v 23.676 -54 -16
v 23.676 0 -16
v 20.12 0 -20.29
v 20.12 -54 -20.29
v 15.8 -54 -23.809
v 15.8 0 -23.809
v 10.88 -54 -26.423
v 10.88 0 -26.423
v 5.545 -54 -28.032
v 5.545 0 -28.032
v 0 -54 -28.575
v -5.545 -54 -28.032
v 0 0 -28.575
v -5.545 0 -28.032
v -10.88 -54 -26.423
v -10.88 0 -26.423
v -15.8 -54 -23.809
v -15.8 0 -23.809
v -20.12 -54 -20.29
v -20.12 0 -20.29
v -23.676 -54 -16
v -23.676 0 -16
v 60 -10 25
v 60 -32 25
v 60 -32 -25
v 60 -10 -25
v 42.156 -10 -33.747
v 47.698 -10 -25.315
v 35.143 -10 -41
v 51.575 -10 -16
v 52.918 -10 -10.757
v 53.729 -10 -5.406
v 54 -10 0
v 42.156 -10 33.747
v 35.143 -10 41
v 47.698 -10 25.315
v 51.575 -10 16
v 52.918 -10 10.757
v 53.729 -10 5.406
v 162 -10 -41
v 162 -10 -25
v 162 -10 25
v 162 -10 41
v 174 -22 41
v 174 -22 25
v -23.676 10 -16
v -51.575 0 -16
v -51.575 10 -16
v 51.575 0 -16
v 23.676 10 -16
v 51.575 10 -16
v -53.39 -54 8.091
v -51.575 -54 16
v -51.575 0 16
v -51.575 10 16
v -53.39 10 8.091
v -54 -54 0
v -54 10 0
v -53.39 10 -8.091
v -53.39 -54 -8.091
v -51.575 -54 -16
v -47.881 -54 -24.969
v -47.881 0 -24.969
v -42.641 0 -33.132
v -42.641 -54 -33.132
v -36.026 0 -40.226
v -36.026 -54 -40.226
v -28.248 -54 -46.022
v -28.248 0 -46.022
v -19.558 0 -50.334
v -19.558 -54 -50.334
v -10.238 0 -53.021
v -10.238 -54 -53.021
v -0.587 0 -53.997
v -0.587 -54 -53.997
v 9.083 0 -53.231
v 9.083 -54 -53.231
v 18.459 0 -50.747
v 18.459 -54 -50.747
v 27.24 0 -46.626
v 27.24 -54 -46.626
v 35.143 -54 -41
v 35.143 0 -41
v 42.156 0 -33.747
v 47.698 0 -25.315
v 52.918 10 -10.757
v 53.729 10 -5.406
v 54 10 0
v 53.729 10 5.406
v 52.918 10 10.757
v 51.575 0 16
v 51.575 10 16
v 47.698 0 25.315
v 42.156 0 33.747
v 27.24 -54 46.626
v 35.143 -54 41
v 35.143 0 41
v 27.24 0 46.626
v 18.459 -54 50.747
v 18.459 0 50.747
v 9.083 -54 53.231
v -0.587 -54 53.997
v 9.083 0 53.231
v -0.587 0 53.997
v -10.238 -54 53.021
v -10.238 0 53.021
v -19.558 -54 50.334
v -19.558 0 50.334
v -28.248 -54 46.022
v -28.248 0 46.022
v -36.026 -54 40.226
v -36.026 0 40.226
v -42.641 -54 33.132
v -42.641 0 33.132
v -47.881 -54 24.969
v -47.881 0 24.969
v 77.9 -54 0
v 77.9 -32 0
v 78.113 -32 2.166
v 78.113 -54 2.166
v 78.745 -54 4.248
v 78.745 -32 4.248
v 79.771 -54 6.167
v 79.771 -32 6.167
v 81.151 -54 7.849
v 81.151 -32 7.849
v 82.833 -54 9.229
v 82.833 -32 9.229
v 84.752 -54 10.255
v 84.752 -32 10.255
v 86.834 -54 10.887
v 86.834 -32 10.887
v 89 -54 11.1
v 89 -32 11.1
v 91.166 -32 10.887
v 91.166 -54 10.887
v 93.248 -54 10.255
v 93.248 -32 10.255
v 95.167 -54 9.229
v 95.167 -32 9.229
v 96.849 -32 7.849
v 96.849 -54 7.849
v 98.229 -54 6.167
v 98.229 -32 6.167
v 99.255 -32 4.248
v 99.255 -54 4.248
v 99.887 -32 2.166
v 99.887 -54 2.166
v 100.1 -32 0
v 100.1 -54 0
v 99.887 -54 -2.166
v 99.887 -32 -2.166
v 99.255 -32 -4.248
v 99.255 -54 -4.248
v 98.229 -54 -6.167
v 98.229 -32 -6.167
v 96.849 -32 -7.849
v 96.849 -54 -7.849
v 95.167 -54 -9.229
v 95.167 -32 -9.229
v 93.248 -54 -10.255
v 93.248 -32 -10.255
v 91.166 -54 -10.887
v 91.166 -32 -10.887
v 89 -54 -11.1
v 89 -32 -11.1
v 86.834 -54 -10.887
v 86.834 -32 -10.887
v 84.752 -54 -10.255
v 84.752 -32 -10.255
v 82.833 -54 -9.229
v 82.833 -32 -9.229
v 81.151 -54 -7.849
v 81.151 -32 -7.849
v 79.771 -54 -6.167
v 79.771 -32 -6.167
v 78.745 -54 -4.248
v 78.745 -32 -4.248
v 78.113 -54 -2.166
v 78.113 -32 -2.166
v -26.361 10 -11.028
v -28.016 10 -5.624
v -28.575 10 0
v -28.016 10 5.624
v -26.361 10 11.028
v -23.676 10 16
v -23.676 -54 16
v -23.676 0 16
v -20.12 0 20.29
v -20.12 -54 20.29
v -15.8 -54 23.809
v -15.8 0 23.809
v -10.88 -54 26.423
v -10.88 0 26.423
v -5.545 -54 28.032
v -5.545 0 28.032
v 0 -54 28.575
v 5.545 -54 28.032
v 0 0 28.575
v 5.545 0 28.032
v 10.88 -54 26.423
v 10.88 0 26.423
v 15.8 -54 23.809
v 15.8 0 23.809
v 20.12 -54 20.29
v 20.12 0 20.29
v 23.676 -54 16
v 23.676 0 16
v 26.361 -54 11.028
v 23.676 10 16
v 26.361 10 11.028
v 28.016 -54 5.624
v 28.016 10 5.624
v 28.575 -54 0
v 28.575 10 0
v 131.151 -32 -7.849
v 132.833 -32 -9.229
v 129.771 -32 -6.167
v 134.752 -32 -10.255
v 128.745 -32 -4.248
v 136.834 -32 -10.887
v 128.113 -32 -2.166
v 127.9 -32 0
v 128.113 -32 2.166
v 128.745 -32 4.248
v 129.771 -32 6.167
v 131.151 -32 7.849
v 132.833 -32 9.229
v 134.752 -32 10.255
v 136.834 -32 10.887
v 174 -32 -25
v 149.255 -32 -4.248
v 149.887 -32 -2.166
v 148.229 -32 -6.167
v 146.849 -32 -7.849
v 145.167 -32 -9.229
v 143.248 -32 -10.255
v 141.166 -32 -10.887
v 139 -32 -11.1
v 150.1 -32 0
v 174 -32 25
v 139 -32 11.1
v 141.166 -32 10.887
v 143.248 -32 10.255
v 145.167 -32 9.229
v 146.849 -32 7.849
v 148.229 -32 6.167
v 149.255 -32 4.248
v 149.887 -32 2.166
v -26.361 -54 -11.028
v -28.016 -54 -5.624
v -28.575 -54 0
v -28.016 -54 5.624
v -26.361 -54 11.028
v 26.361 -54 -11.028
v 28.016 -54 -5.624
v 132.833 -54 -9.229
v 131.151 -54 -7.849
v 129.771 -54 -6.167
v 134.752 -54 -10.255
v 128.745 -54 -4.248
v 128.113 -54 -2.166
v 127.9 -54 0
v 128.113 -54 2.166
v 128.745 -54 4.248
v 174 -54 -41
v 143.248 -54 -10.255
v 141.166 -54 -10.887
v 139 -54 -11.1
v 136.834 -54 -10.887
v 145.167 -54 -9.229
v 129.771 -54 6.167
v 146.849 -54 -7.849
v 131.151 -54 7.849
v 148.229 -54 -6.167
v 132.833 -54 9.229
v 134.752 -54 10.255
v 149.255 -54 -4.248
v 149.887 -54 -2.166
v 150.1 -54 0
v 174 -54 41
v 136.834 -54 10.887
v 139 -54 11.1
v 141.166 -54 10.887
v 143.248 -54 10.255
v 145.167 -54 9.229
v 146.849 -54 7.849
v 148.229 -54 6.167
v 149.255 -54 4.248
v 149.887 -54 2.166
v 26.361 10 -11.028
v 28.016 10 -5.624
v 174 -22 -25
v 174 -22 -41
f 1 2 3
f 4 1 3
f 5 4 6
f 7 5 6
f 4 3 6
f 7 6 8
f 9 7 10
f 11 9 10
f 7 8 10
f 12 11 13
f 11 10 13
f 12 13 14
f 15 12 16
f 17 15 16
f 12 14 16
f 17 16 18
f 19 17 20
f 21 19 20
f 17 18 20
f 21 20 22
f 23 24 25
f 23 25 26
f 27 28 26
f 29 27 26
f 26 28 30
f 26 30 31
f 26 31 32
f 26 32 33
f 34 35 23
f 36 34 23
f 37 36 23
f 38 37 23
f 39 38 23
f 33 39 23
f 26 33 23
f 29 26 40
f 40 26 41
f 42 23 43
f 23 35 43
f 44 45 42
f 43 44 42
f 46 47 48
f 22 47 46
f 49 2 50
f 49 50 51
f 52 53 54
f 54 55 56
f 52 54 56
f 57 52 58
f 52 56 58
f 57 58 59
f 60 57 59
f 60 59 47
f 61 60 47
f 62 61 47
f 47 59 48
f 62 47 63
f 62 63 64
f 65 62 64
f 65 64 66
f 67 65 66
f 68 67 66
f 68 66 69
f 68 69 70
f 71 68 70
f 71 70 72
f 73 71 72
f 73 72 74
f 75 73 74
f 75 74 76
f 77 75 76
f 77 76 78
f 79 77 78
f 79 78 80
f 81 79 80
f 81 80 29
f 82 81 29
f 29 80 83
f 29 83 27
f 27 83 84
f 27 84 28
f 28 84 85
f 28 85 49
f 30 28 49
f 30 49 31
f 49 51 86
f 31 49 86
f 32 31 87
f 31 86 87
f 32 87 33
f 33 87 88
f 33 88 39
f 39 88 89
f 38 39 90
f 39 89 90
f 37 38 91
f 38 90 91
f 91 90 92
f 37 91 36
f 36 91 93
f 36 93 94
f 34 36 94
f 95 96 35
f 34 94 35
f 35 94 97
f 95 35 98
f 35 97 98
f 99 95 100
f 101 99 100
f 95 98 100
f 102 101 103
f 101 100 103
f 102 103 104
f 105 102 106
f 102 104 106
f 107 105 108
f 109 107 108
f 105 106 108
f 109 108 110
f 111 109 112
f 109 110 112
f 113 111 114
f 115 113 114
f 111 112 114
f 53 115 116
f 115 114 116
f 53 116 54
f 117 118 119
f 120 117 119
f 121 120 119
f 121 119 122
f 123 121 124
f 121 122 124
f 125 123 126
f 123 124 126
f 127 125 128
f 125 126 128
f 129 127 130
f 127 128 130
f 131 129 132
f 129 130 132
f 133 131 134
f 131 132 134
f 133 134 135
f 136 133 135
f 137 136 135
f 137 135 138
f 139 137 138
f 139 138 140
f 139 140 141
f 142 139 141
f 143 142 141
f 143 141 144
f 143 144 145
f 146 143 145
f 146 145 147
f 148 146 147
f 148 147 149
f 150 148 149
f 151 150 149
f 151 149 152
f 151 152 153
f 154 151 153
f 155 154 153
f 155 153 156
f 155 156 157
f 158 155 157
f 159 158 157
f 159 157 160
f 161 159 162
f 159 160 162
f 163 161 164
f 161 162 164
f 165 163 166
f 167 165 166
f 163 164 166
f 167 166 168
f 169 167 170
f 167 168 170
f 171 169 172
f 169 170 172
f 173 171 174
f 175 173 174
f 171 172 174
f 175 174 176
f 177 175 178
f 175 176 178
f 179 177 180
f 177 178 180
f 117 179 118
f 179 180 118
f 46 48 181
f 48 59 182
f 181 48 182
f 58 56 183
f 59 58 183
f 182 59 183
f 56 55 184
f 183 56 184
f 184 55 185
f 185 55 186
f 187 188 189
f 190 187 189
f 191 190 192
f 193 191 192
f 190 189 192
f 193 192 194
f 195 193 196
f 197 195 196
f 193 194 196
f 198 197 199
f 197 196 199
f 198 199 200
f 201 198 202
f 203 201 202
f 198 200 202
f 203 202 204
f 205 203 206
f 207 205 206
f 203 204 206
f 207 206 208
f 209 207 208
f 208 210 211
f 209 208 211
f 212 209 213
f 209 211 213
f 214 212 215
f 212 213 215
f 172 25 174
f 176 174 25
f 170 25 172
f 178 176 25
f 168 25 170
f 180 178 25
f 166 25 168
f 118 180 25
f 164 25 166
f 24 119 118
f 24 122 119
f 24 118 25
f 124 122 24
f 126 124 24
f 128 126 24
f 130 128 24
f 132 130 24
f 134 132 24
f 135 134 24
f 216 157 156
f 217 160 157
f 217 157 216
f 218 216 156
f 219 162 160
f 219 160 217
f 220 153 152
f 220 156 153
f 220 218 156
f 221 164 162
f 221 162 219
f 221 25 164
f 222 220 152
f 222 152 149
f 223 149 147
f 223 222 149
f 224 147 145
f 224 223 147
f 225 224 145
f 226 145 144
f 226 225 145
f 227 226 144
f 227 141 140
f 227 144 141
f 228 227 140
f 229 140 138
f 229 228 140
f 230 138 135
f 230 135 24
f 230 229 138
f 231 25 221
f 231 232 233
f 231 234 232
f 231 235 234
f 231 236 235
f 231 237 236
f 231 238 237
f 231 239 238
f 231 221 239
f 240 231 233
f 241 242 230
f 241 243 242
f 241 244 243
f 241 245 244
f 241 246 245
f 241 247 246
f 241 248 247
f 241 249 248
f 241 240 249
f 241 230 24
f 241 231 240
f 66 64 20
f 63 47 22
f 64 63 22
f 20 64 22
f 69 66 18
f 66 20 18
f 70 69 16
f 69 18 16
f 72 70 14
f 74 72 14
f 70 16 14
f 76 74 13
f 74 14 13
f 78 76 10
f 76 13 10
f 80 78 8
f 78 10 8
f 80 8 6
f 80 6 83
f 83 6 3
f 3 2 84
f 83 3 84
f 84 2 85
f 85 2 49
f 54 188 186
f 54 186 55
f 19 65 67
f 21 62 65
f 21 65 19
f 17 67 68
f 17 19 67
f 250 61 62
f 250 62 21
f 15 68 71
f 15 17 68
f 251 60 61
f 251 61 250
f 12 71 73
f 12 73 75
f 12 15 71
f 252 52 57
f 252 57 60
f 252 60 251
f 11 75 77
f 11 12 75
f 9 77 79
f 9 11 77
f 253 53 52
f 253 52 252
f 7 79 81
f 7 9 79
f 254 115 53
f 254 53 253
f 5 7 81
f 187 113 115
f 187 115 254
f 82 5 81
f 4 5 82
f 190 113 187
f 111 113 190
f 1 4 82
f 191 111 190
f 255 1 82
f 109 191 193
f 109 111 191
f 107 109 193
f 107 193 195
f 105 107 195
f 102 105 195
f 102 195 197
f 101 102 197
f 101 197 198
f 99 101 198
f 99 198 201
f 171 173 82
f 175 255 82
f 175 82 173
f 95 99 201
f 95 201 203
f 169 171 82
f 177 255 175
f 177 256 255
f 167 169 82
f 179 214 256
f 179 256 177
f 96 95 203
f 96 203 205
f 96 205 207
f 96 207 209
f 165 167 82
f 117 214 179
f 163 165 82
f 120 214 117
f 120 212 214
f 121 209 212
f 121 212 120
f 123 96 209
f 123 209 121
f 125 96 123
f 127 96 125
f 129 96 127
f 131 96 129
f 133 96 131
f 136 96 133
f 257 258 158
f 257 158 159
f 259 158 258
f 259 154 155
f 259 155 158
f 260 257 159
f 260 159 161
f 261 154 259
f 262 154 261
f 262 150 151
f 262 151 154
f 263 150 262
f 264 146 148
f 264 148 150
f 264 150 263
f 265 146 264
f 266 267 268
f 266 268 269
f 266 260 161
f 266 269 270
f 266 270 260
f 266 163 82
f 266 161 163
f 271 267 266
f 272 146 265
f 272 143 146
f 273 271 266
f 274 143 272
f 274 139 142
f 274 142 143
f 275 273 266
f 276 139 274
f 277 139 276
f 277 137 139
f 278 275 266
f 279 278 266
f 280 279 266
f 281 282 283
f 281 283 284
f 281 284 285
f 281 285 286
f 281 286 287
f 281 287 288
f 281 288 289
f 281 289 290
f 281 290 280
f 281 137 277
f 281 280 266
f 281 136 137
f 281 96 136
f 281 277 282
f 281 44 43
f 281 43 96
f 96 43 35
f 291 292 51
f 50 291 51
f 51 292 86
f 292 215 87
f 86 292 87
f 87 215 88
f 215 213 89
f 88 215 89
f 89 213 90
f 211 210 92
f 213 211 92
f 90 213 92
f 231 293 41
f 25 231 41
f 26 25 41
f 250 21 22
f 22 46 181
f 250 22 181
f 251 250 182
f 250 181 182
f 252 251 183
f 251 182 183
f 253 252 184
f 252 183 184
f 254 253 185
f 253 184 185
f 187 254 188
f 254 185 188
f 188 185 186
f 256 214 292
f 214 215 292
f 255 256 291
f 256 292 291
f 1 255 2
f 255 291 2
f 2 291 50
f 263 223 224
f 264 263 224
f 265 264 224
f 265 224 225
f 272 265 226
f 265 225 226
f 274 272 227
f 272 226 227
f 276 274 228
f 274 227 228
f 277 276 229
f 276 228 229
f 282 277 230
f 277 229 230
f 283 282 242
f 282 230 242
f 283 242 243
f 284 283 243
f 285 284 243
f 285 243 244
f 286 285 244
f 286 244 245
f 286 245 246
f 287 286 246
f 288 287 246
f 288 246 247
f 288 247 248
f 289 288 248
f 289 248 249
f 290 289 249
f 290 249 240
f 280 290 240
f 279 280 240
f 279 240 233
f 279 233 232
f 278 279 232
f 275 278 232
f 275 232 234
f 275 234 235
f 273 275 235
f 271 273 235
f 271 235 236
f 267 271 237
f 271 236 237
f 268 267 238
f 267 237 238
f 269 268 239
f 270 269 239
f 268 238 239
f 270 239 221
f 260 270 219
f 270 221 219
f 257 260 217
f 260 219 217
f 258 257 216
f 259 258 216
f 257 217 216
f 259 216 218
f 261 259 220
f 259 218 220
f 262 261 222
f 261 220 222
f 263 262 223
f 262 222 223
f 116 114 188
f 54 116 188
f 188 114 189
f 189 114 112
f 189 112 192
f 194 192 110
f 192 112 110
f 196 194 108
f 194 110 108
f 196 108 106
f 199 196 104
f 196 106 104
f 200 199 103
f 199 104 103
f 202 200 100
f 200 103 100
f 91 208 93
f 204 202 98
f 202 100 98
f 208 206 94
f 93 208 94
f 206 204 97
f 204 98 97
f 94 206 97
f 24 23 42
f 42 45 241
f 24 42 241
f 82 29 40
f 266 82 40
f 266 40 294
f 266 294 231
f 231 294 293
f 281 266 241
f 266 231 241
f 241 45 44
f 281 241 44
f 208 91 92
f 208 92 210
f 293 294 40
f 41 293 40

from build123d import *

# Parameters (mm, degrees)
F1_DEPTH = 54
F2_DEPTH = 10
F3_START = 10
F3_DEPTH = 44
F5_DEPTH = 95.001
F6_W     = 10
F6_H     = 50
F6_W_2   = 12
F7_DEPTH = 114
F8_R     = 11.1
F9_DEPTH = 22.001


with BuildPart() as f1:
    # F0 (on Front) → F1 (new body)
    with BuildSketch(Plane.XZ):
        with BuildLine():
            ThreePointArc((-23.6755279772, 16), (0, 28.575), (23.6755279772, 16))
            Line((23.6755279772, 16), (51.5751878329, 16))
            ThreePointArc((51.5751878329, 16), (45.1247409006, 29.6607106903), (35.1425667816, 41))
            ThreePointArc((35.1425667816, 41), (-14.9585346426, 51.8868214612), (-51.5751878329, 16))
            Line((-51.5751878329, 16), (-23.6755279772, 16))
        make_face()
        with BuildLine():
            Line((51.5751878329, -16), (23.6755279772, -16))
            ThreePointArc((23.6755279772, -16), (0, -28.575), (-23.6755279772, -16))
            Line((-23.6755279772, -16), (-51.5751878329, -16))
            ThreePointArc((-51.5751878329, -16), (-14.9585346426, -51.8868214612), (35.1425667816, -41))
            ThreePointArc((35.1425667816, -41), (45.1247409006, -29.6607106903), (51.5751878329, -16))
        make_face()
        with BuildLine():
            ThreePointArc((23.6755279772, 16), (27.3226905424, 8.3666723687), (28.575, 0))
            ThreePointArc((28.575, 0), (27.3226905424, -8.3666723687), (23.6755279772, -16))
            Line((23.6755279772, -16), (51.5751878329, -16))
            ThreePointArc((51.5751878329, -16), (53.3903556037, -8.0913489921), (54, 0))
            ThreePointArc((54, 0), (53.3903556037, 8.0913489921), (51.5751878329, 16))
            Line((51.5751878329, 16), (23.6755279772, 16))
        make_face()
        with BuildLine():
            ThreePointArc((-23.6755279772, -16), (-28.575, 0), (-23.6755279772, 16))
            Line((-23.6755279772, 16), (-51.5751878329, 16))
            ThreePointArc((-51.5751878329, 16), (-54, 0), (-51.5751878329, -16))
            Line((-51.5751878329, -16), (-23.6755279772, -16))
        make_face()
    extrude(amount=F1_DEPTH)

    # F0 (on Front) → F2 (join)
    with BuildSketch(Plane.XZ):
        with BuildLine():
            ThreePointArc((-23.6755279772, -16), (-28.575, 0), (-23.6755279772, 16))
            Line((-23.6755279772, 16), (-51.5751878329, 16))
            ThreePointArc((-51.5751878329, 16), (-54, 0), (-51.5751878329, -16))
            Line((-51.5751878329, -16), (-23.6755279772, -16))
        make_face()
        with BuildLine():
            ThreePointArc((23.6755279772, 16), (27.3226905424, 8.3666723687), (28.575, 0))
            ThreePointArc((28.575, 0), (27.3226905424, -8.3666723687), (23.6755279772, -16))
            Line((23.6755279772, -16), (51.5751878329, -16))
            ThreePointArc((51.5751878329, -16), (53.3903556037, -8.0913489921), (54, 0))
            ThreePointArc((54, 0), (53.3903556037, 8.0913489921), (51.5751878329, 16))
            Line((51.5751878329, 16), (23.6755279772, 16))
        make_face()
    extrude(amount=-F2_DEPTH)

    # F0 (on Front) → F3 (join)
    with BuildSketch(Plane.XZ.offset(F3_START)):
        with BuildLine():
            ThreePointArc((35.1425667816, 41), (45.1247409006, 29.6607106903), (51.5751878329, 16))
            ThreePointArc((51.5751878329, 16), (53.3903556037, 8.0913489921), (54, 0))
            ThreePointArc((54, 0), (53.3903556037, -8.0913489921), (51.5751878329, -16))
            ThreePointArc((51.5751878329, -16), (45.1247409006, -29.6607106903), (35.1425667816, -41))
            Line((35.1425667816, -41), (174, -41))
            Line((174, -41), (174, 41))
            Line((174, 41), (35.1425667816, 41))
        make_face()
    extrude(amount=F3_DEPTH)

    # F4 (on face) → F5 (cut, through all)
    with BuildSketch(Plane(origin=(0, 0, -41), x_dir=(1, 0, 0), z_dir=(0, 0, -1))):
        Polygon((174, 22), (162, 10), (174, 10), align=None)
    extrude(amount=-F5_DEPTH, mode=Mode.SUBTRACT)

    # F6 (on face) → F7 (cut)
    with BuildSketch(Plane.YZ.offset(174)):
        with Locations((-27, 0)):
            Rectangle(F6_W, F6_H)
        with Locations((-16, 0)):
            Rectangle(F6_W_2, F6_H)
    extrude(amount=-F7_DEPTH, mode=Mode.SUBTRACT)

    # F8 (on face) → F9 (cut, through all)
    with BuildSketch(Plane(origin=(0, -32, 0), x_dir=(-1, 0, 0), z_dir=(0, 1, 0))):
        with Locations((-139, 0)):
            Circle(F8_R)
        with Locations((-89, 0)):
            Circle(F8_R)
    extrude(amount=-F9_DEPTH, mode=Mode.SUBTRACT)


solid = f1.part
